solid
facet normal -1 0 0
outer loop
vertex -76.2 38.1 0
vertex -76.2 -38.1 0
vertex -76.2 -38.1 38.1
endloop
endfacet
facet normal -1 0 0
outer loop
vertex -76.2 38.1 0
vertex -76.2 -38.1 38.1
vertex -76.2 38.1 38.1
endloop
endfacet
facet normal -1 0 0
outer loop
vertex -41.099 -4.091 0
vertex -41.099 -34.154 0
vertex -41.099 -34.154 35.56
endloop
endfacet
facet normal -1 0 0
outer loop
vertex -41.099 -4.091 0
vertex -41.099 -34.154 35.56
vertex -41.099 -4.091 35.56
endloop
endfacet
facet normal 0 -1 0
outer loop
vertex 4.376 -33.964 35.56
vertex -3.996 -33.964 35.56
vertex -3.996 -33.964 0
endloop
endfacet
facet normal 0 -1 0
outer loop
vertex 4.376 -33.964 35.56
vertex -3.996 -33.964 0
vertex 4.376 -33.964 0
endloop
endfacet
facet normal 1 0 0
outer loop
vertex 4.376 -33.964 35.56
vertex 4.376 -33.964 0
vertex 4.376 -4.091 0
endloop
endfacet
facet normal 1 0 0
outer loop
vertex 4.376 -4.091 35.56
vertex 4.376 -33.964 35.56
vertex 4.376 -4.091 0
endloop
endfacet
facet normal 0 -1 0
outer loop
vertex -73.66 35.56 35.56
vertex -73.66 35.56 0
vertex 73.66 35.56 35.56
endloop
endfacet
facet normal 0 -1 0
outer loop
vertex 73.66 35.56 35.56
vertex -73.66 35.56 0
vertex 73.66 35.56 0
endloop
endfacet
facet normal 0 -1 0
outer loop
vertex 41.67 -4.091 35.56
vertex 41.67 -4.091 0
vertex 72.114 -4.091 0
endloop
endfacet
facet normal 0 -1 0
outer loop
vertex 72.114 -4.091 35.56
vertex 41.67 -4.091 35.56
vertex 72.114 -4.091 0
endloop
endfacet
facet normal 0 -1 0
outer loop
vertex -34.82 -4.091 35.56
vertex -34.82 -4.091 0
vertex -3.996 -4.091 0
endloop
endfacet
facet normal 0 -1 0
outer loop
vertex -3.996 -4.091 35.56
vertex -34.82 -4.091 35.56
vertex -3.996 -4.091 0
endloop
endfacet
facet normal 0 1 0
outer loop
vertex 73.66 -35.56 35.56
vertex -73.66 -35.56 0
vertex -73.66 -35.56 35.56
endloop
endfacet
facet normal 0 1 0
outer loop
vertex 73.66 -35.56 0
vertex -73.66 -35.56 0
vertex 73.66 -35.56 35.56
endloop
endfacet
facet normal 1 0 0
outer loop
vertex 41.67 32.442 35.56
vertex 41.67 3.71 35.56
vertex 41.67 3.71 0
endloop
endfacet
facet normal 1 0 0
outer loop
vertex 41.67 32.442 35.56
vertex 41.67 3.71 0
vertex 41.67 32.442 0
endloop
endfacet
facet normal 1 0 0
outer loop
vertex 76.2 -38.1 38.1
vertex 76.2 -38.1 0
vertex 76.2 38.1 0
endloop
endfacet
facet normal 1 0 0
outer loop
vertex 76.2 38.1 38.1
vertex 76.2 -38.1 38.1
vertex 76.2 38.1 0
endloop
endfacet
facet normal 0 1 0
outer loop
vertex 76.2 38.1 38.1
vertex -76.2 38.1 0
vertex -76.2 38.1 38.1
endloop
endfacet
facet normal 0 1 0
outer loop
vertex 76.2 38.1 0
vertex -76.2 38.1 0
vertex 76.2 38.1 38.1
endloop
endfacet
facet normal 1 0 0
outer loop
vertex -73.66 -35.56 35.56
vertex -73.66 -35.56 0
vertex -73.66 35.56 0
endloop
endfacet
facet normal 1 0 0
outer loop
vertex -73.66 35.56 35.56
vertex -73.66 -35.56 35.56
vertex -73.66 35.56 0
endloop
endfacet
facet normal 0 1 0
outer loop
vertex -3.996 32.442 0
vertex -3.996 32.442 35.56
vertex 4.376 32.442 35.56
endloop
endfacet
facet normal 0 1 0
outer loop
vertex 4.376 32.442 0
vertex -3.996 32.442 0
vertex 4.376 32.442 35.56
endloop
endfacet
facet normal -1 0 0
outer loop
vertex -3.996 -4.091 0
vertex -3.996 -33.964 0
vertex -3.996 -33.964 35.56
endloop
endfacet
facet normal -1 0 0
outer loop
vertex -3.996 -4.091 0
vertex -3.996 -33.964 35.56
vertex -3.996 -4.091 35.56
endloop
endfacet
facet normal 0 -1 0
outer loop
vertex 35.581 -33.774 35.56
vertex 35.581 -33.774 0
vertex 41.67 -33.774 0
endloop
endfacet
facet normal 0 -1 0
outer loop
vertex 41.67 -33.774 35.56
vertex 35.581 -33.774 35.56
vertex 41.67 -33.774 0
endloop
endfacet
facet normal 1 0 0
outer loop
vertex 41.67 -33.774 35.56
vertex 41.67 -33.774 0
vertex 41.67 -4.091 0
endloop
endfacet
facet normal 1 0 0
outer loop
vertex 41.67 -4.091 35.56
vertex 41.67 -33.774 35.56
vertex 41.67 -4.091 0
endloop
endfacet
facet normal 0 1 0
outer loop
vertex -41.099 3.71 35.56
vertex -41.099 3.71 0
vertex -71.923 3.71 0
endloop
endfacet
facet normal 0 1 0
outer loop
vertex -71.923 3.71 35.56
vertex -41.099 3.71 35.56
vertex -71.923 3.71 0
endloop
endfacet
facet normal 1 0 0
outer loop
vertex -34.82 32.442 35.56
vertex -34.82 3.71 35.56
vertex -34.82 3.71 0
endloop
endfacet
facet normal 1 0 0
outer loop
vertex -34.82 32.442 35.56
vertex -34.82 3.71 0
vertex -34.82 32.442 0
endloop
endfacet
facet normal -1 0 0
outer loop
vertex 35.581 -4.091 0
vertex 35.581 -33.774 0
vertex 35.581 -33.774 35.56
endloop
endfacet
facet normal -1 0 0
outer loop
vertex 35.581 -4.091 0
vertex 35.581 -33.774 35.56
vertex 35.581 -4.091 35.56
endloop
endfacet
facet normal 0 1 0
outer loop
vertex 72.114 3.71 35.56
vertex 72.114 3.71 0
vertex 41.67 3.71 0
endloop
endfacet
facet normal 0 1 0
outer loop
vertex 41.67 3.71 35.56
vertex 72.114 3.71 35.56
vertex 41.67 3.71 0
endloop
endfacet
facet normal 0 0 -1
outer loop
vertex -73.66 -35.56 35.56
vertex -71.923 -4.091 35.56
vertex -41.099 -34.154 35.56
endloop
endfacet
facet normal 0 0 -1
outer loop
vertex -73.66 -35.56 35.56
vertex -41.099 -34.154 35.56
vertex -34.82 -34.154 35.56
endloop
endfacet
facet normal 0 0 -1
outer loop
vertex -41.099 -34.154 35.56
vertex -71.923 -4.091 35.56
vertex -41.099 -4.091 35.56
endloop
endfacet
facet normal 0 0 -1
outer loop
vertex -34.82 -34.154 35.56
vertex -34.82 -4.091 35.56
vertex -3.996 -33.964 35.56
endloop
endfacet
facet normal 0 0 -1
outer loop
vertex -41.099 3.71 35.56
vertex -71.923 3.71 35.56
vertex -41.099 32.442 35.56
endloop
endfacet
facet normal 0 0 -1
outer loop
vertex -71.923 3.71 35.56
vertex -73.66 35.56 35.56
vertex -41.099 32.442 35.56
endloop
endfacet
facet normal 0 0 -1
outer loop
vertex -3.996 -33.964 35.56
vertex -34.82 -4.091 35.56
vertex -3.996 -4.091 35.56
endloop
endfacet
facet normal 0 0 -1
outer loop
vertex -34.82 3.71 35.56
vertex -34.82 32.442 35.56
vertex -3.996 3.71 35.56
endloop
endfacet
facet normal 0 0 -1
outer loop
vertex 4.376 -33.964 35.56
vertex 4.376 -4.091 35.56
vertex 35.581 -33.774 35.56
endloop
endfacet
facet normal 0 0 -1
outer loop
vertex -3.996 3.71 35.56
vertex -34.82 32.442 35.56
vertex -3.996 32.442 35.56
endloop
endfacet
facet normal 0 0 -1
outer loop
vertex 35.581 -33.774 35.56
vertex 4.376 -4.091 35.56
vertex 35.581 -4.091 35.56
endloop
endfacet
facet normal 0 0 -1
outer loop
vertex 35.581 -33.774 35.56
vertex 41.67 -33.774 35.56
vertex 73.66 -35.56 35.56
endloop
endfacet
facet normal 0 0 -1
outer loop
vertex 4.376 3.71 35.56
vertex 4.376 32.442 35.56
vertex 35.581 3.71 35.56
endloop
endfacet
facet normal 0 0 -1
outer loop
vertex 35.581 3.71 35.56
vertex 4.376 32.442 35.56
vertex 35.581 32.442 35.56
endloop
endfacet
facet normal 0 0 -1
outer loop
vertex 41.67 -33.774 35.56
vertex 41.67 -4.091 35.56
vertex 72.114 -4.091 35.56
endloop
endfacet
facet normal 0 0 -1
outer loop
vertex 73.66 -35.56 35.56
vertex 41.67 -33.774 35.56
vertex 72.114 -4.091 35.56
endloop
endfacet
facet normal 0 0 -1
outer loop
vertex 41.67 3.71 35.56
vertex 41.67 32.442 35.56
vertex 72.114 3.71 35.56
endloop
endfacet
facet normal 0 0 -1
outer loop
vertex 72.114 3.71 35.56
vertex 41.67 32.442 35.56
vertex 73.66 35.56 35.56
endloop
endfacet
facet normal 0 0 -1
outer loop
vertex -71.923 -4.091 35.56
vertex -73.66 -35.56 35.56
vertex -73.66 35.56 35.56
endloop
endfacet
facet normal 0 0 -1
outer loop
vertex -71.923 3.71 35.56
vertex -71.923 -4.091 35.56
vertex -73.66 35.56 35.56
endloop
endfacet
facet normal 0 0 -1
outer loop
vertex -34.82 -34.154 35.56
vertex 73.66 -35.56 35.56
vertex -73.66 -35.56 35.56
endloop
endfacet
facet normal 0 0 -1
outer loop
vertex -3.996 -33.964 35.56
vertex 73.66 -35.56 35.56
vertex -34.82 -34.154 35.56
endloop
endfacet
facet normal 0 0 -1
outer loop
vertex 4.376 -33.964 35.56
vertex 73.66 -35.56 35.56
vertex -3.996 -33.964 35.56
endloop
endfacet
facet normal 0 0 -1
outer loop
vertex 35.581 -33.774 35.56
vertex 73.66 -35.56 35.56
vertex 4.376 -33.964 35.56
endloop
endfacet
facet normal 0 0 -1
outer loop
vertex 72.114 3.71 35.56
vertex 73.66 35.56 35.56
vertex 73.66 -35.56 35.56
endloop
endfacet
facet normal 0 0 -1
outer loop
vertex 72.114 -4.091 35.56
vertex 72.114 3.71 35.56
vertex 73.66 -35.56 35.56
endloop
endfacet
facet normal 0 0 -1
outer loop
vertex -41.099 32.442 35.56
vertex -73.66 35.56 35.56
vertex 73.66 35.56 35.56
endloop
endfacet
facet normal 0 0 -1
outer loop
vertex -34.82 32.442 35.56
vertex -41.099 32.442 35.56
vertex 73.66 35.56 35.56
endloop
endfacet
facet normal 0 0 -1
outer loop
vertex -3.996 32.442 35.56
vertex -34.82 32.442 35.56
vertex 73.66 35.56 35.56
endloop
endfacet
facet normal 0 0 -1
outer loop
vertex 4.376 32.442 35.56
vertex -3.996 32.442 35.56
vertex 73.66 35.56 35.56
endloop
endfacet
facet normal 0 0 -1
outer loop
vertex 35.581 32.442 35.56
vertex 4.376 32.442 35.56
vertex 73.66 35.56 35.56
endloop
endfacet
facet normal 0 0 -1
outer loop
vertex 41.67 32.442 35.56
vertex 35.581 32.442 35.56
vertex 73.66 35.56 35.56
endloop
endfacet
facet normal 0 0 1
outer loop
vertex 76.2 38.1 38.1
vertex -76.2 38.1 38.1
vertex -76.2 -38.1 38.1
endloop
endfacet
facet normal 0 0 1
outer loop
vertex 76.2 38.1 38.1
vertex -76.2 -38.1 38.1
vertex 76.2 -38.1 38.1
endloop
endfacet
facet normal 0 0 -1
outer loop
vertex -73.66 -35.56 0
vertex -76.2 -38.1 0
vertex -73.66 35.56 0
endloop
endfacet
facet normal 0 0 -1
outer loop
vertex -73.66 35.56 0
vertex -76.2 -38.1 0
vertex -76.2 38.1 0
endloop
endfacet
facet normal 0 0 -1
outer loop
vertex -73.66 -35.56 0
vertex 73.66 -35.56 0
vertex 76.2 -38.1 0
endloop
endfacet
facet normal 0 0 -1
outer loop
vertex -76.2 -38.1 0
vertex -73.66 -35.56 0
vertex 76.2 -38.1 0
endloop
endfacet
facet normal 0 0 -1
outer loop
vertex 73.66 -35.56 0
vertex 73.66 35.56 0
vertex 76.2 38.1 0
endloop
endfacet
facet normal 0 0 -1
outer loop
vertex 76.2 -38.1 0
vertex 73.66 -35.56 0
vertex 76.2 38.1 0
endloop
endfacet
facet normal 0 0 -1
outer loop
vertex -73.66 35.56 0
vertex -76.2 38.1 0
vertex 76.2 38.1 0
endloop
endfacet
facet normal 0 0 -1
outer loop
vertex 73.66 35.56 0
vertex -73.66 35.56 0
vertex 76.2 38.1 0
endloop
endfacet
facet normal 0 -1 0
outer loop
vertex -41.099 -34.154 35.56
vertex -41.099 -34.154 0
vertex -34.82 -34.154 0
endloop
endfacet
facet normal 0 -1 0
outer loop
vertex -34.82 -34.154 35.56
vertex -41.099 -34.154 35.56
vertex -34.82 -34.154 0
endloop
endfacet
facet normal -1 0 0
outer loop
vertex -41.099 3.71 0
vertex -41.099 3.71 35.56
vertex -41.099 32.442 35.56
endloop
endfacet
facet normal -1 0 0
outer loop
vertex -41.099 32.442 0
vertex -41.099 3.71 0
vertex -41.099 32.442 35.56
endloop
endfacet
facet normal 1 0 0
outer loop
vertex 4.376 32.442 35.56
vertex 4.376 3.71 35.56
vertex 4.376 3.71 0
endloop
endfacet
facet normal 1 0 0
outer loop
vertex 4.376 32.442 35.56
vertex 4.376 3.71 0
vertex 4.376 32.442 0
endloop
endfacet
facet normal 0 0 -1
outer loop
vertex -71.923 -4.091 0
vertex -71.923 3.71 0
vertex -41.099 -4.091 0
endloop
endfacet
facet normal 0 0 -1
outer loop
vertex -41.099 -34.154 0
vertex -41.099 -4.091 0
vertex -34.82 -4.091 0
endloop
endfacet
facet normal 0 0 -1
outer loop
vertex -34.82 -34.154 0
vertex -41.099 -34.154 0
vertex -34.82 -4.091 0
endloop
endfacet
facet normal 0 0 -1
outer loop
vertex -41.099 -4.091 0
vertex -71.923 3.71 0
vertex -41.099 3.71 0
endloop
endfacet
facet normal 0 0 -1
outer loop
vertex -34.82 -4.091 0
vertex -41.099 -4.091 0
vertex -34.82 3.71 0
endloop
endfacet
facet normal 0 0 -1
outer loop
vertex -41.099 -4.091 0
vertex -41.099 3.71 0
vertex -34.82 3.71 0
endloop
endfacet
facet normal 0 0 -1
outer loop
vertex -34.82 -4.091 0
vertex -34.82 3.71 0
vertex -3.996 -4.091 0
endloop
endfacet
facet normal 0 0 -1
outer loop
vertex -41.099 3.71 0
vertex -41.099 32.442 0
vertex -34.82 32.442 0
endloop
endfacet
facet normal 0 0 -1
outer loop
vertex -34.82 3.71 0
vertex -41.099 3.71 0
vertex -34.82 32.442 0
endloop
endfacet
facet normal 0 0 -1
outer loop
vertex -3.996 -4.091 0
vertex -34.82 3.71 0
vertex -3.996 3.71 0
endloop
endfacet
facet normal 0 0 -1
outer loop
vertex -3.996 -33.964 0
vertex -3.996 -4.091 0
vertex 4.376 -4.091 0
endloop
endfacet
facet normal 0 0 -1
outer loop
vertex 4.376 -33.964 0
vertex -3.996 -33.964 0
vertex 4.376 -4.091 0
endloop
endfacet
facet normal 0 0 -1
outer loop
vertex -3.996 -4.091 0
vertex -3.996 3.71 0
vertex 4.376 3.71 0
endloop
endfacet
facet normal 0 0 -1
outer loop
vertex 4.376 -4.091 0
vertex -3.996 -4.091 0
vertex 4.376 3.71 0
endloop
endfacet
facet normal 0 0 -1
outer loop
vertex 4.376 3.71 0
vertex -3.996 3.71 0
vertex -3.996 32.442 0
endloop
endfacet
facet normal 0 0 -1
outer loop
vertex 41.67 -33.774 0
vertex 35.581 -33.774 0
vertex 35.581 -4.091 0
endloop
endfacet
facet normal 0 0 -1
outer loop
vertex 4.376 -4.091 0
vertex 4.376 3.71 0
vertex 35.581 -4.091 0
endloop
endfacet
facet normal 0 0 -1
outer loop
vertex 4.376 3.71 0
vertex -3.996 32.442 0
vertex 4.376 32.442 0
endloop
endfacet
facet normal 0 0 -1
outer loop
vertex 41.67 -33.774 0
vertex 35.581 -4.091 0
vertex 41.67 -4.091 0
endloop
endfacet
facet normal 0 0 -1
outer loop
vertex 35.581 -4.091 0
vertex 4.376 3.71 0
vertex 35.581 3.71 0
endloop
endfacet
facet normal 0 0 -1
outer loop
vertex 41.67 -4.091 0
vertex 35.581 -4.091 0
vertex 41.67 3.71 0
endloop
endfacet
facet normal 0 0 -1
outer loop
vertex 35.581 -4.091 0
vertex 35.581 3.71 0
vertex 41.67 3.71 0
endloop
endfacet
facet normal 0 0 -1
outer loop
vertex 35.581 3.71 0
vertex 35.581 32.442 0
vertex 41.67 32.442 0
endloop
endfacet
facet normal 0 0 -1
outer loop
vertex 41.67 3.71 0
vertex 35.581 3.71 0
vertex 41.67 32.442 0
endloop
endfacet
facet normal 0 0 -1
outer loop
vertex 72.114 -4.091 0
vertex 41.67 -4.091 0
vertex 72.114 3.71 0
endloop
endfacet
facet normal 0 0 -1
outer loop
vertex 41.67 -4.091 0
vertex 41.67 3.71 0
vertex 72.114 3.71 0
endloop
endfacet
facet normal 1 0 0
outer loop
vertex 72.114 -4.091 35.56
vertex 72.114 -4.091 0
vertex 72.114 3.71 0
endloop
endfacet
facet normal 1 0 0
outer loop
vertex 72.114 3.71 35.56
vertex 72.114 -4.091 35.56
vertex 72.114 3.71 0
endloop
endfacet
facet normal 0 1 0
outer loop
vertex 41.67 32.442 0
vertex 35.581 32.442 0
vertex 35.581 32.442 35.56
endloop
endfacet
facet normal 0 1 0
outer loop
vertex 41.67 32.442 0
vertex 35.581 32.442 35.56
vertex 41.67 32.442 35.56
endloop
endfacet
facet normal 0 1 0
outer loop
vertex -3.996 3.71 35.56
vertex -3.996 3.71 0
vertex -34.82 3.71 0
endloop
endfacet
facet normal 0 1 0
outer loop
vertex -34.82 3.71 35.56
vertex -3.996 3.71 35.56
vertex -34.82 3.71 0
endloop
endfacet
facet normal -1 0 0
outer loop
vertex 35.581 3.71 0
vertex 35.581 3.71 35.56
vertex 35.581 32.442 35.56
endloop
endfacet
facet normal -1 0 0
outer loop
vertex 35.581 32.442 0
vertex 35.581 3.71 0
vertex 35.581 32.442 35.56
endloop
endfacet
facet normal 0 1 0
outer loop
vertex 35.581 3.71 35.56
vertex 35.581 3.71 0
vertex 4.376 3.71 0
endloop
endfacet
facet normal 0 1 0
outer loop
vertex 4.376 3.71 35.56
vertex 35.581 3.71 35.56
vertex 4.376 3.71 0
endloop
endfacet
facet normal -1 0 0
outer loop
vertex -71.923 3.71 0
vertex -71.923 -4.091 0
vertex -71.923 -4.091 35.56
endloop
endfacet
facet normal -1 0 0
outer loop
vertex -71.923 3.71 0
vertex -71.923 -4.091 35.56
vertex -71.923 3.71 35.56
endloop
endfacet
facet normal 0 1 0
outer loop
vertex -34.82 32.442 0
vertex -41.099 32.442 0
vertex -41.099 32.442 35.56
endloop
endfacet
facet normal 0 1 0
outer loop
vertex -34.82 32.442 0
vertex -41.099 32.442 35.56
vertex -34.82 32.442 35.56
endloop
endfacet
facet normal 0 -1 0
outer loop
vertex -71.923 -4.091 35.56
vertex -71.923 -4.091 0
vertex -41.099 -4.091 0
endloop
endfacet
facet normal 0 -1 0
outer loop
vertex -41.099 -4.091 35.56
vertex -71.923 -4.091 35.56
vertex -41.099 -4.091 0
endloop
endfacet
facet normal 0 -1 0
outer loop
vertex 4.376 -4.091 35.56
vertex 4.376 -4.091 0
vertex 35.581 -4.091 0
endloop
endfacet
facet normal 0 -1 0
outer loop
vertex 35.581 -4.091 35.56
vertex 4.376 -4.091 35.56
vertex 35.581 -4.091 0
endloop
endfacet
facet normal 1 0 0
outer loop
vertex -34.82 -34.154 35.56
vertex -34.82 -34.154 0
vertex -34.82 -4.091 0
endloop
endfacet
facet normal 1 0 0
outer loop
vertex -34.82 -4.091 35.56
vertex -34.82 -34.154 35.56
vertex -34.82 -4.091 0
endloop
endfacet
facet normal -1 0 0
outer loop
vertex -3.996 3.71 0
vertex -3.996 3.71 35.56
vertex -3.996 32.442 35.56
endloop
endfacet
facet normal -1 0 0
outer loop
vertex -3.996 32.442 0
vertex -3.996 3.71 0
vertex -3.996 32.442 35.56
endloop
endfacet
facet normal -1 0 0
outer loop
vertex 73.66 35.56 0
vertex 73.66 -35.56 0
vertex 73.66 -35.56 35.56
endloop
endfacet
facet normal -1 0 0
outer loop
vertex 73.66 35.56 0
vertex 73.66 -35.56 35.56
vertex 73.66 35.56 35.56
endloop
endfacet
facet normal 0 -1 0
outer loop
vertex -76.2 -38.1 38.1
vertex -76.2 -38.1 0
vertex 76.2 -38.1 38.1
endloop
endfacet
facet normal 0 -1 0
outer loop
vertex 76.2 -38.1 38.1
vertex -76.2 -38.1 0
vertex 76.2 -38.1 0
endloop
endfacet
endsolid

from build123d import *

# Parameters (mm, degrees)
F0_W     = 152.4
F0_H     = 76.2
F1_DEPTH = 38.1
F2_T     = -2.54
F3_W     = 30.8243110776
F3_H     = 7.8012128361
F3_W_2   = 6.2790252268
F3_H_2   = 30.0632109866
F3_W_3   = 30.8243031614
F3_H_3   = 28.7312981673
F3_W_4   = 8.3720344119
F3_H_4   = 29.8729380593
F3_W_5   = 31.2048504129
F3_W_6   = 6.0887485743
F3_H_5   = 29.6826614067
F3_W_7   = 30.443765223
F4_DEPTH = 38.1


with BuildPart() as f1:
    # F0 (on Top) → F1 (new body)
    with BuildSketch(Plane.XY):
        Rectangle(F0_W, F0_H)
    extrude(amount=F1_DEPTH)

    # F2
    f2_openings = [f1.faces().sort_by_distance(p)[0] for p in [
        (0, 0, 0),
    ]]
    offset(amount=F2_T, openings=f2_openings)

    # F3 (on Top) → F4 (join)
    with BuildSketch(Plane.XY):
        with Locations((-56.5112270415, -0.1902736258)):
            Rectangle(F3_W, F3_H)
        with Locations((-37.9595588893, -0.1902736258)):
            Rectangle(F3_W_2, F3_H)
        with Locations((-37.9595588893, -19.1224855371)):
            Rectangle(F3_W_2, F3_H_2)
        with Locations((-19.4078946952, -0.1902736258)):
            Rectangle(F3_W_3, F3_H)
        with Locations((-37.9595588893, 18.0759818759)):
            Rectangle(F3_W_2, F3_H_3)
        with Locations((0.1902740914, -0.1902736258)):
            Rectangle(F3_W_4, F3_H)
        with Locations((0.1902740914, -19.0273490734)):
            Rectangle(F3_W_4, F3_H_4)
        with Locations((19.9787165038, -0.1902736258)):
            Rectangle(F3_W_5, F3_H)
        with Locations((0.1902740914, 18.0759818759)):
            Rectangle(F3_W_4, F3_H_3)
        with Locations((38.6255159974, -0.1902736258)):
            Rectangle(F3_W_6, F3_H)
        with Locations((38.6255159974, -18.9322107472)):
            Rectangle(F3_W_6, F3_H_5)
        with Locations((56.8917728961, -0.1902736258)):
            Rectangle(F3_W_7, F3_H)
        with Locations((38.6255159974, 18.0759818759)):
            Rectangle(F3_W_6, F3_H_3)
    extrude(amount=F4_DEPTH)


solid = f1.part
